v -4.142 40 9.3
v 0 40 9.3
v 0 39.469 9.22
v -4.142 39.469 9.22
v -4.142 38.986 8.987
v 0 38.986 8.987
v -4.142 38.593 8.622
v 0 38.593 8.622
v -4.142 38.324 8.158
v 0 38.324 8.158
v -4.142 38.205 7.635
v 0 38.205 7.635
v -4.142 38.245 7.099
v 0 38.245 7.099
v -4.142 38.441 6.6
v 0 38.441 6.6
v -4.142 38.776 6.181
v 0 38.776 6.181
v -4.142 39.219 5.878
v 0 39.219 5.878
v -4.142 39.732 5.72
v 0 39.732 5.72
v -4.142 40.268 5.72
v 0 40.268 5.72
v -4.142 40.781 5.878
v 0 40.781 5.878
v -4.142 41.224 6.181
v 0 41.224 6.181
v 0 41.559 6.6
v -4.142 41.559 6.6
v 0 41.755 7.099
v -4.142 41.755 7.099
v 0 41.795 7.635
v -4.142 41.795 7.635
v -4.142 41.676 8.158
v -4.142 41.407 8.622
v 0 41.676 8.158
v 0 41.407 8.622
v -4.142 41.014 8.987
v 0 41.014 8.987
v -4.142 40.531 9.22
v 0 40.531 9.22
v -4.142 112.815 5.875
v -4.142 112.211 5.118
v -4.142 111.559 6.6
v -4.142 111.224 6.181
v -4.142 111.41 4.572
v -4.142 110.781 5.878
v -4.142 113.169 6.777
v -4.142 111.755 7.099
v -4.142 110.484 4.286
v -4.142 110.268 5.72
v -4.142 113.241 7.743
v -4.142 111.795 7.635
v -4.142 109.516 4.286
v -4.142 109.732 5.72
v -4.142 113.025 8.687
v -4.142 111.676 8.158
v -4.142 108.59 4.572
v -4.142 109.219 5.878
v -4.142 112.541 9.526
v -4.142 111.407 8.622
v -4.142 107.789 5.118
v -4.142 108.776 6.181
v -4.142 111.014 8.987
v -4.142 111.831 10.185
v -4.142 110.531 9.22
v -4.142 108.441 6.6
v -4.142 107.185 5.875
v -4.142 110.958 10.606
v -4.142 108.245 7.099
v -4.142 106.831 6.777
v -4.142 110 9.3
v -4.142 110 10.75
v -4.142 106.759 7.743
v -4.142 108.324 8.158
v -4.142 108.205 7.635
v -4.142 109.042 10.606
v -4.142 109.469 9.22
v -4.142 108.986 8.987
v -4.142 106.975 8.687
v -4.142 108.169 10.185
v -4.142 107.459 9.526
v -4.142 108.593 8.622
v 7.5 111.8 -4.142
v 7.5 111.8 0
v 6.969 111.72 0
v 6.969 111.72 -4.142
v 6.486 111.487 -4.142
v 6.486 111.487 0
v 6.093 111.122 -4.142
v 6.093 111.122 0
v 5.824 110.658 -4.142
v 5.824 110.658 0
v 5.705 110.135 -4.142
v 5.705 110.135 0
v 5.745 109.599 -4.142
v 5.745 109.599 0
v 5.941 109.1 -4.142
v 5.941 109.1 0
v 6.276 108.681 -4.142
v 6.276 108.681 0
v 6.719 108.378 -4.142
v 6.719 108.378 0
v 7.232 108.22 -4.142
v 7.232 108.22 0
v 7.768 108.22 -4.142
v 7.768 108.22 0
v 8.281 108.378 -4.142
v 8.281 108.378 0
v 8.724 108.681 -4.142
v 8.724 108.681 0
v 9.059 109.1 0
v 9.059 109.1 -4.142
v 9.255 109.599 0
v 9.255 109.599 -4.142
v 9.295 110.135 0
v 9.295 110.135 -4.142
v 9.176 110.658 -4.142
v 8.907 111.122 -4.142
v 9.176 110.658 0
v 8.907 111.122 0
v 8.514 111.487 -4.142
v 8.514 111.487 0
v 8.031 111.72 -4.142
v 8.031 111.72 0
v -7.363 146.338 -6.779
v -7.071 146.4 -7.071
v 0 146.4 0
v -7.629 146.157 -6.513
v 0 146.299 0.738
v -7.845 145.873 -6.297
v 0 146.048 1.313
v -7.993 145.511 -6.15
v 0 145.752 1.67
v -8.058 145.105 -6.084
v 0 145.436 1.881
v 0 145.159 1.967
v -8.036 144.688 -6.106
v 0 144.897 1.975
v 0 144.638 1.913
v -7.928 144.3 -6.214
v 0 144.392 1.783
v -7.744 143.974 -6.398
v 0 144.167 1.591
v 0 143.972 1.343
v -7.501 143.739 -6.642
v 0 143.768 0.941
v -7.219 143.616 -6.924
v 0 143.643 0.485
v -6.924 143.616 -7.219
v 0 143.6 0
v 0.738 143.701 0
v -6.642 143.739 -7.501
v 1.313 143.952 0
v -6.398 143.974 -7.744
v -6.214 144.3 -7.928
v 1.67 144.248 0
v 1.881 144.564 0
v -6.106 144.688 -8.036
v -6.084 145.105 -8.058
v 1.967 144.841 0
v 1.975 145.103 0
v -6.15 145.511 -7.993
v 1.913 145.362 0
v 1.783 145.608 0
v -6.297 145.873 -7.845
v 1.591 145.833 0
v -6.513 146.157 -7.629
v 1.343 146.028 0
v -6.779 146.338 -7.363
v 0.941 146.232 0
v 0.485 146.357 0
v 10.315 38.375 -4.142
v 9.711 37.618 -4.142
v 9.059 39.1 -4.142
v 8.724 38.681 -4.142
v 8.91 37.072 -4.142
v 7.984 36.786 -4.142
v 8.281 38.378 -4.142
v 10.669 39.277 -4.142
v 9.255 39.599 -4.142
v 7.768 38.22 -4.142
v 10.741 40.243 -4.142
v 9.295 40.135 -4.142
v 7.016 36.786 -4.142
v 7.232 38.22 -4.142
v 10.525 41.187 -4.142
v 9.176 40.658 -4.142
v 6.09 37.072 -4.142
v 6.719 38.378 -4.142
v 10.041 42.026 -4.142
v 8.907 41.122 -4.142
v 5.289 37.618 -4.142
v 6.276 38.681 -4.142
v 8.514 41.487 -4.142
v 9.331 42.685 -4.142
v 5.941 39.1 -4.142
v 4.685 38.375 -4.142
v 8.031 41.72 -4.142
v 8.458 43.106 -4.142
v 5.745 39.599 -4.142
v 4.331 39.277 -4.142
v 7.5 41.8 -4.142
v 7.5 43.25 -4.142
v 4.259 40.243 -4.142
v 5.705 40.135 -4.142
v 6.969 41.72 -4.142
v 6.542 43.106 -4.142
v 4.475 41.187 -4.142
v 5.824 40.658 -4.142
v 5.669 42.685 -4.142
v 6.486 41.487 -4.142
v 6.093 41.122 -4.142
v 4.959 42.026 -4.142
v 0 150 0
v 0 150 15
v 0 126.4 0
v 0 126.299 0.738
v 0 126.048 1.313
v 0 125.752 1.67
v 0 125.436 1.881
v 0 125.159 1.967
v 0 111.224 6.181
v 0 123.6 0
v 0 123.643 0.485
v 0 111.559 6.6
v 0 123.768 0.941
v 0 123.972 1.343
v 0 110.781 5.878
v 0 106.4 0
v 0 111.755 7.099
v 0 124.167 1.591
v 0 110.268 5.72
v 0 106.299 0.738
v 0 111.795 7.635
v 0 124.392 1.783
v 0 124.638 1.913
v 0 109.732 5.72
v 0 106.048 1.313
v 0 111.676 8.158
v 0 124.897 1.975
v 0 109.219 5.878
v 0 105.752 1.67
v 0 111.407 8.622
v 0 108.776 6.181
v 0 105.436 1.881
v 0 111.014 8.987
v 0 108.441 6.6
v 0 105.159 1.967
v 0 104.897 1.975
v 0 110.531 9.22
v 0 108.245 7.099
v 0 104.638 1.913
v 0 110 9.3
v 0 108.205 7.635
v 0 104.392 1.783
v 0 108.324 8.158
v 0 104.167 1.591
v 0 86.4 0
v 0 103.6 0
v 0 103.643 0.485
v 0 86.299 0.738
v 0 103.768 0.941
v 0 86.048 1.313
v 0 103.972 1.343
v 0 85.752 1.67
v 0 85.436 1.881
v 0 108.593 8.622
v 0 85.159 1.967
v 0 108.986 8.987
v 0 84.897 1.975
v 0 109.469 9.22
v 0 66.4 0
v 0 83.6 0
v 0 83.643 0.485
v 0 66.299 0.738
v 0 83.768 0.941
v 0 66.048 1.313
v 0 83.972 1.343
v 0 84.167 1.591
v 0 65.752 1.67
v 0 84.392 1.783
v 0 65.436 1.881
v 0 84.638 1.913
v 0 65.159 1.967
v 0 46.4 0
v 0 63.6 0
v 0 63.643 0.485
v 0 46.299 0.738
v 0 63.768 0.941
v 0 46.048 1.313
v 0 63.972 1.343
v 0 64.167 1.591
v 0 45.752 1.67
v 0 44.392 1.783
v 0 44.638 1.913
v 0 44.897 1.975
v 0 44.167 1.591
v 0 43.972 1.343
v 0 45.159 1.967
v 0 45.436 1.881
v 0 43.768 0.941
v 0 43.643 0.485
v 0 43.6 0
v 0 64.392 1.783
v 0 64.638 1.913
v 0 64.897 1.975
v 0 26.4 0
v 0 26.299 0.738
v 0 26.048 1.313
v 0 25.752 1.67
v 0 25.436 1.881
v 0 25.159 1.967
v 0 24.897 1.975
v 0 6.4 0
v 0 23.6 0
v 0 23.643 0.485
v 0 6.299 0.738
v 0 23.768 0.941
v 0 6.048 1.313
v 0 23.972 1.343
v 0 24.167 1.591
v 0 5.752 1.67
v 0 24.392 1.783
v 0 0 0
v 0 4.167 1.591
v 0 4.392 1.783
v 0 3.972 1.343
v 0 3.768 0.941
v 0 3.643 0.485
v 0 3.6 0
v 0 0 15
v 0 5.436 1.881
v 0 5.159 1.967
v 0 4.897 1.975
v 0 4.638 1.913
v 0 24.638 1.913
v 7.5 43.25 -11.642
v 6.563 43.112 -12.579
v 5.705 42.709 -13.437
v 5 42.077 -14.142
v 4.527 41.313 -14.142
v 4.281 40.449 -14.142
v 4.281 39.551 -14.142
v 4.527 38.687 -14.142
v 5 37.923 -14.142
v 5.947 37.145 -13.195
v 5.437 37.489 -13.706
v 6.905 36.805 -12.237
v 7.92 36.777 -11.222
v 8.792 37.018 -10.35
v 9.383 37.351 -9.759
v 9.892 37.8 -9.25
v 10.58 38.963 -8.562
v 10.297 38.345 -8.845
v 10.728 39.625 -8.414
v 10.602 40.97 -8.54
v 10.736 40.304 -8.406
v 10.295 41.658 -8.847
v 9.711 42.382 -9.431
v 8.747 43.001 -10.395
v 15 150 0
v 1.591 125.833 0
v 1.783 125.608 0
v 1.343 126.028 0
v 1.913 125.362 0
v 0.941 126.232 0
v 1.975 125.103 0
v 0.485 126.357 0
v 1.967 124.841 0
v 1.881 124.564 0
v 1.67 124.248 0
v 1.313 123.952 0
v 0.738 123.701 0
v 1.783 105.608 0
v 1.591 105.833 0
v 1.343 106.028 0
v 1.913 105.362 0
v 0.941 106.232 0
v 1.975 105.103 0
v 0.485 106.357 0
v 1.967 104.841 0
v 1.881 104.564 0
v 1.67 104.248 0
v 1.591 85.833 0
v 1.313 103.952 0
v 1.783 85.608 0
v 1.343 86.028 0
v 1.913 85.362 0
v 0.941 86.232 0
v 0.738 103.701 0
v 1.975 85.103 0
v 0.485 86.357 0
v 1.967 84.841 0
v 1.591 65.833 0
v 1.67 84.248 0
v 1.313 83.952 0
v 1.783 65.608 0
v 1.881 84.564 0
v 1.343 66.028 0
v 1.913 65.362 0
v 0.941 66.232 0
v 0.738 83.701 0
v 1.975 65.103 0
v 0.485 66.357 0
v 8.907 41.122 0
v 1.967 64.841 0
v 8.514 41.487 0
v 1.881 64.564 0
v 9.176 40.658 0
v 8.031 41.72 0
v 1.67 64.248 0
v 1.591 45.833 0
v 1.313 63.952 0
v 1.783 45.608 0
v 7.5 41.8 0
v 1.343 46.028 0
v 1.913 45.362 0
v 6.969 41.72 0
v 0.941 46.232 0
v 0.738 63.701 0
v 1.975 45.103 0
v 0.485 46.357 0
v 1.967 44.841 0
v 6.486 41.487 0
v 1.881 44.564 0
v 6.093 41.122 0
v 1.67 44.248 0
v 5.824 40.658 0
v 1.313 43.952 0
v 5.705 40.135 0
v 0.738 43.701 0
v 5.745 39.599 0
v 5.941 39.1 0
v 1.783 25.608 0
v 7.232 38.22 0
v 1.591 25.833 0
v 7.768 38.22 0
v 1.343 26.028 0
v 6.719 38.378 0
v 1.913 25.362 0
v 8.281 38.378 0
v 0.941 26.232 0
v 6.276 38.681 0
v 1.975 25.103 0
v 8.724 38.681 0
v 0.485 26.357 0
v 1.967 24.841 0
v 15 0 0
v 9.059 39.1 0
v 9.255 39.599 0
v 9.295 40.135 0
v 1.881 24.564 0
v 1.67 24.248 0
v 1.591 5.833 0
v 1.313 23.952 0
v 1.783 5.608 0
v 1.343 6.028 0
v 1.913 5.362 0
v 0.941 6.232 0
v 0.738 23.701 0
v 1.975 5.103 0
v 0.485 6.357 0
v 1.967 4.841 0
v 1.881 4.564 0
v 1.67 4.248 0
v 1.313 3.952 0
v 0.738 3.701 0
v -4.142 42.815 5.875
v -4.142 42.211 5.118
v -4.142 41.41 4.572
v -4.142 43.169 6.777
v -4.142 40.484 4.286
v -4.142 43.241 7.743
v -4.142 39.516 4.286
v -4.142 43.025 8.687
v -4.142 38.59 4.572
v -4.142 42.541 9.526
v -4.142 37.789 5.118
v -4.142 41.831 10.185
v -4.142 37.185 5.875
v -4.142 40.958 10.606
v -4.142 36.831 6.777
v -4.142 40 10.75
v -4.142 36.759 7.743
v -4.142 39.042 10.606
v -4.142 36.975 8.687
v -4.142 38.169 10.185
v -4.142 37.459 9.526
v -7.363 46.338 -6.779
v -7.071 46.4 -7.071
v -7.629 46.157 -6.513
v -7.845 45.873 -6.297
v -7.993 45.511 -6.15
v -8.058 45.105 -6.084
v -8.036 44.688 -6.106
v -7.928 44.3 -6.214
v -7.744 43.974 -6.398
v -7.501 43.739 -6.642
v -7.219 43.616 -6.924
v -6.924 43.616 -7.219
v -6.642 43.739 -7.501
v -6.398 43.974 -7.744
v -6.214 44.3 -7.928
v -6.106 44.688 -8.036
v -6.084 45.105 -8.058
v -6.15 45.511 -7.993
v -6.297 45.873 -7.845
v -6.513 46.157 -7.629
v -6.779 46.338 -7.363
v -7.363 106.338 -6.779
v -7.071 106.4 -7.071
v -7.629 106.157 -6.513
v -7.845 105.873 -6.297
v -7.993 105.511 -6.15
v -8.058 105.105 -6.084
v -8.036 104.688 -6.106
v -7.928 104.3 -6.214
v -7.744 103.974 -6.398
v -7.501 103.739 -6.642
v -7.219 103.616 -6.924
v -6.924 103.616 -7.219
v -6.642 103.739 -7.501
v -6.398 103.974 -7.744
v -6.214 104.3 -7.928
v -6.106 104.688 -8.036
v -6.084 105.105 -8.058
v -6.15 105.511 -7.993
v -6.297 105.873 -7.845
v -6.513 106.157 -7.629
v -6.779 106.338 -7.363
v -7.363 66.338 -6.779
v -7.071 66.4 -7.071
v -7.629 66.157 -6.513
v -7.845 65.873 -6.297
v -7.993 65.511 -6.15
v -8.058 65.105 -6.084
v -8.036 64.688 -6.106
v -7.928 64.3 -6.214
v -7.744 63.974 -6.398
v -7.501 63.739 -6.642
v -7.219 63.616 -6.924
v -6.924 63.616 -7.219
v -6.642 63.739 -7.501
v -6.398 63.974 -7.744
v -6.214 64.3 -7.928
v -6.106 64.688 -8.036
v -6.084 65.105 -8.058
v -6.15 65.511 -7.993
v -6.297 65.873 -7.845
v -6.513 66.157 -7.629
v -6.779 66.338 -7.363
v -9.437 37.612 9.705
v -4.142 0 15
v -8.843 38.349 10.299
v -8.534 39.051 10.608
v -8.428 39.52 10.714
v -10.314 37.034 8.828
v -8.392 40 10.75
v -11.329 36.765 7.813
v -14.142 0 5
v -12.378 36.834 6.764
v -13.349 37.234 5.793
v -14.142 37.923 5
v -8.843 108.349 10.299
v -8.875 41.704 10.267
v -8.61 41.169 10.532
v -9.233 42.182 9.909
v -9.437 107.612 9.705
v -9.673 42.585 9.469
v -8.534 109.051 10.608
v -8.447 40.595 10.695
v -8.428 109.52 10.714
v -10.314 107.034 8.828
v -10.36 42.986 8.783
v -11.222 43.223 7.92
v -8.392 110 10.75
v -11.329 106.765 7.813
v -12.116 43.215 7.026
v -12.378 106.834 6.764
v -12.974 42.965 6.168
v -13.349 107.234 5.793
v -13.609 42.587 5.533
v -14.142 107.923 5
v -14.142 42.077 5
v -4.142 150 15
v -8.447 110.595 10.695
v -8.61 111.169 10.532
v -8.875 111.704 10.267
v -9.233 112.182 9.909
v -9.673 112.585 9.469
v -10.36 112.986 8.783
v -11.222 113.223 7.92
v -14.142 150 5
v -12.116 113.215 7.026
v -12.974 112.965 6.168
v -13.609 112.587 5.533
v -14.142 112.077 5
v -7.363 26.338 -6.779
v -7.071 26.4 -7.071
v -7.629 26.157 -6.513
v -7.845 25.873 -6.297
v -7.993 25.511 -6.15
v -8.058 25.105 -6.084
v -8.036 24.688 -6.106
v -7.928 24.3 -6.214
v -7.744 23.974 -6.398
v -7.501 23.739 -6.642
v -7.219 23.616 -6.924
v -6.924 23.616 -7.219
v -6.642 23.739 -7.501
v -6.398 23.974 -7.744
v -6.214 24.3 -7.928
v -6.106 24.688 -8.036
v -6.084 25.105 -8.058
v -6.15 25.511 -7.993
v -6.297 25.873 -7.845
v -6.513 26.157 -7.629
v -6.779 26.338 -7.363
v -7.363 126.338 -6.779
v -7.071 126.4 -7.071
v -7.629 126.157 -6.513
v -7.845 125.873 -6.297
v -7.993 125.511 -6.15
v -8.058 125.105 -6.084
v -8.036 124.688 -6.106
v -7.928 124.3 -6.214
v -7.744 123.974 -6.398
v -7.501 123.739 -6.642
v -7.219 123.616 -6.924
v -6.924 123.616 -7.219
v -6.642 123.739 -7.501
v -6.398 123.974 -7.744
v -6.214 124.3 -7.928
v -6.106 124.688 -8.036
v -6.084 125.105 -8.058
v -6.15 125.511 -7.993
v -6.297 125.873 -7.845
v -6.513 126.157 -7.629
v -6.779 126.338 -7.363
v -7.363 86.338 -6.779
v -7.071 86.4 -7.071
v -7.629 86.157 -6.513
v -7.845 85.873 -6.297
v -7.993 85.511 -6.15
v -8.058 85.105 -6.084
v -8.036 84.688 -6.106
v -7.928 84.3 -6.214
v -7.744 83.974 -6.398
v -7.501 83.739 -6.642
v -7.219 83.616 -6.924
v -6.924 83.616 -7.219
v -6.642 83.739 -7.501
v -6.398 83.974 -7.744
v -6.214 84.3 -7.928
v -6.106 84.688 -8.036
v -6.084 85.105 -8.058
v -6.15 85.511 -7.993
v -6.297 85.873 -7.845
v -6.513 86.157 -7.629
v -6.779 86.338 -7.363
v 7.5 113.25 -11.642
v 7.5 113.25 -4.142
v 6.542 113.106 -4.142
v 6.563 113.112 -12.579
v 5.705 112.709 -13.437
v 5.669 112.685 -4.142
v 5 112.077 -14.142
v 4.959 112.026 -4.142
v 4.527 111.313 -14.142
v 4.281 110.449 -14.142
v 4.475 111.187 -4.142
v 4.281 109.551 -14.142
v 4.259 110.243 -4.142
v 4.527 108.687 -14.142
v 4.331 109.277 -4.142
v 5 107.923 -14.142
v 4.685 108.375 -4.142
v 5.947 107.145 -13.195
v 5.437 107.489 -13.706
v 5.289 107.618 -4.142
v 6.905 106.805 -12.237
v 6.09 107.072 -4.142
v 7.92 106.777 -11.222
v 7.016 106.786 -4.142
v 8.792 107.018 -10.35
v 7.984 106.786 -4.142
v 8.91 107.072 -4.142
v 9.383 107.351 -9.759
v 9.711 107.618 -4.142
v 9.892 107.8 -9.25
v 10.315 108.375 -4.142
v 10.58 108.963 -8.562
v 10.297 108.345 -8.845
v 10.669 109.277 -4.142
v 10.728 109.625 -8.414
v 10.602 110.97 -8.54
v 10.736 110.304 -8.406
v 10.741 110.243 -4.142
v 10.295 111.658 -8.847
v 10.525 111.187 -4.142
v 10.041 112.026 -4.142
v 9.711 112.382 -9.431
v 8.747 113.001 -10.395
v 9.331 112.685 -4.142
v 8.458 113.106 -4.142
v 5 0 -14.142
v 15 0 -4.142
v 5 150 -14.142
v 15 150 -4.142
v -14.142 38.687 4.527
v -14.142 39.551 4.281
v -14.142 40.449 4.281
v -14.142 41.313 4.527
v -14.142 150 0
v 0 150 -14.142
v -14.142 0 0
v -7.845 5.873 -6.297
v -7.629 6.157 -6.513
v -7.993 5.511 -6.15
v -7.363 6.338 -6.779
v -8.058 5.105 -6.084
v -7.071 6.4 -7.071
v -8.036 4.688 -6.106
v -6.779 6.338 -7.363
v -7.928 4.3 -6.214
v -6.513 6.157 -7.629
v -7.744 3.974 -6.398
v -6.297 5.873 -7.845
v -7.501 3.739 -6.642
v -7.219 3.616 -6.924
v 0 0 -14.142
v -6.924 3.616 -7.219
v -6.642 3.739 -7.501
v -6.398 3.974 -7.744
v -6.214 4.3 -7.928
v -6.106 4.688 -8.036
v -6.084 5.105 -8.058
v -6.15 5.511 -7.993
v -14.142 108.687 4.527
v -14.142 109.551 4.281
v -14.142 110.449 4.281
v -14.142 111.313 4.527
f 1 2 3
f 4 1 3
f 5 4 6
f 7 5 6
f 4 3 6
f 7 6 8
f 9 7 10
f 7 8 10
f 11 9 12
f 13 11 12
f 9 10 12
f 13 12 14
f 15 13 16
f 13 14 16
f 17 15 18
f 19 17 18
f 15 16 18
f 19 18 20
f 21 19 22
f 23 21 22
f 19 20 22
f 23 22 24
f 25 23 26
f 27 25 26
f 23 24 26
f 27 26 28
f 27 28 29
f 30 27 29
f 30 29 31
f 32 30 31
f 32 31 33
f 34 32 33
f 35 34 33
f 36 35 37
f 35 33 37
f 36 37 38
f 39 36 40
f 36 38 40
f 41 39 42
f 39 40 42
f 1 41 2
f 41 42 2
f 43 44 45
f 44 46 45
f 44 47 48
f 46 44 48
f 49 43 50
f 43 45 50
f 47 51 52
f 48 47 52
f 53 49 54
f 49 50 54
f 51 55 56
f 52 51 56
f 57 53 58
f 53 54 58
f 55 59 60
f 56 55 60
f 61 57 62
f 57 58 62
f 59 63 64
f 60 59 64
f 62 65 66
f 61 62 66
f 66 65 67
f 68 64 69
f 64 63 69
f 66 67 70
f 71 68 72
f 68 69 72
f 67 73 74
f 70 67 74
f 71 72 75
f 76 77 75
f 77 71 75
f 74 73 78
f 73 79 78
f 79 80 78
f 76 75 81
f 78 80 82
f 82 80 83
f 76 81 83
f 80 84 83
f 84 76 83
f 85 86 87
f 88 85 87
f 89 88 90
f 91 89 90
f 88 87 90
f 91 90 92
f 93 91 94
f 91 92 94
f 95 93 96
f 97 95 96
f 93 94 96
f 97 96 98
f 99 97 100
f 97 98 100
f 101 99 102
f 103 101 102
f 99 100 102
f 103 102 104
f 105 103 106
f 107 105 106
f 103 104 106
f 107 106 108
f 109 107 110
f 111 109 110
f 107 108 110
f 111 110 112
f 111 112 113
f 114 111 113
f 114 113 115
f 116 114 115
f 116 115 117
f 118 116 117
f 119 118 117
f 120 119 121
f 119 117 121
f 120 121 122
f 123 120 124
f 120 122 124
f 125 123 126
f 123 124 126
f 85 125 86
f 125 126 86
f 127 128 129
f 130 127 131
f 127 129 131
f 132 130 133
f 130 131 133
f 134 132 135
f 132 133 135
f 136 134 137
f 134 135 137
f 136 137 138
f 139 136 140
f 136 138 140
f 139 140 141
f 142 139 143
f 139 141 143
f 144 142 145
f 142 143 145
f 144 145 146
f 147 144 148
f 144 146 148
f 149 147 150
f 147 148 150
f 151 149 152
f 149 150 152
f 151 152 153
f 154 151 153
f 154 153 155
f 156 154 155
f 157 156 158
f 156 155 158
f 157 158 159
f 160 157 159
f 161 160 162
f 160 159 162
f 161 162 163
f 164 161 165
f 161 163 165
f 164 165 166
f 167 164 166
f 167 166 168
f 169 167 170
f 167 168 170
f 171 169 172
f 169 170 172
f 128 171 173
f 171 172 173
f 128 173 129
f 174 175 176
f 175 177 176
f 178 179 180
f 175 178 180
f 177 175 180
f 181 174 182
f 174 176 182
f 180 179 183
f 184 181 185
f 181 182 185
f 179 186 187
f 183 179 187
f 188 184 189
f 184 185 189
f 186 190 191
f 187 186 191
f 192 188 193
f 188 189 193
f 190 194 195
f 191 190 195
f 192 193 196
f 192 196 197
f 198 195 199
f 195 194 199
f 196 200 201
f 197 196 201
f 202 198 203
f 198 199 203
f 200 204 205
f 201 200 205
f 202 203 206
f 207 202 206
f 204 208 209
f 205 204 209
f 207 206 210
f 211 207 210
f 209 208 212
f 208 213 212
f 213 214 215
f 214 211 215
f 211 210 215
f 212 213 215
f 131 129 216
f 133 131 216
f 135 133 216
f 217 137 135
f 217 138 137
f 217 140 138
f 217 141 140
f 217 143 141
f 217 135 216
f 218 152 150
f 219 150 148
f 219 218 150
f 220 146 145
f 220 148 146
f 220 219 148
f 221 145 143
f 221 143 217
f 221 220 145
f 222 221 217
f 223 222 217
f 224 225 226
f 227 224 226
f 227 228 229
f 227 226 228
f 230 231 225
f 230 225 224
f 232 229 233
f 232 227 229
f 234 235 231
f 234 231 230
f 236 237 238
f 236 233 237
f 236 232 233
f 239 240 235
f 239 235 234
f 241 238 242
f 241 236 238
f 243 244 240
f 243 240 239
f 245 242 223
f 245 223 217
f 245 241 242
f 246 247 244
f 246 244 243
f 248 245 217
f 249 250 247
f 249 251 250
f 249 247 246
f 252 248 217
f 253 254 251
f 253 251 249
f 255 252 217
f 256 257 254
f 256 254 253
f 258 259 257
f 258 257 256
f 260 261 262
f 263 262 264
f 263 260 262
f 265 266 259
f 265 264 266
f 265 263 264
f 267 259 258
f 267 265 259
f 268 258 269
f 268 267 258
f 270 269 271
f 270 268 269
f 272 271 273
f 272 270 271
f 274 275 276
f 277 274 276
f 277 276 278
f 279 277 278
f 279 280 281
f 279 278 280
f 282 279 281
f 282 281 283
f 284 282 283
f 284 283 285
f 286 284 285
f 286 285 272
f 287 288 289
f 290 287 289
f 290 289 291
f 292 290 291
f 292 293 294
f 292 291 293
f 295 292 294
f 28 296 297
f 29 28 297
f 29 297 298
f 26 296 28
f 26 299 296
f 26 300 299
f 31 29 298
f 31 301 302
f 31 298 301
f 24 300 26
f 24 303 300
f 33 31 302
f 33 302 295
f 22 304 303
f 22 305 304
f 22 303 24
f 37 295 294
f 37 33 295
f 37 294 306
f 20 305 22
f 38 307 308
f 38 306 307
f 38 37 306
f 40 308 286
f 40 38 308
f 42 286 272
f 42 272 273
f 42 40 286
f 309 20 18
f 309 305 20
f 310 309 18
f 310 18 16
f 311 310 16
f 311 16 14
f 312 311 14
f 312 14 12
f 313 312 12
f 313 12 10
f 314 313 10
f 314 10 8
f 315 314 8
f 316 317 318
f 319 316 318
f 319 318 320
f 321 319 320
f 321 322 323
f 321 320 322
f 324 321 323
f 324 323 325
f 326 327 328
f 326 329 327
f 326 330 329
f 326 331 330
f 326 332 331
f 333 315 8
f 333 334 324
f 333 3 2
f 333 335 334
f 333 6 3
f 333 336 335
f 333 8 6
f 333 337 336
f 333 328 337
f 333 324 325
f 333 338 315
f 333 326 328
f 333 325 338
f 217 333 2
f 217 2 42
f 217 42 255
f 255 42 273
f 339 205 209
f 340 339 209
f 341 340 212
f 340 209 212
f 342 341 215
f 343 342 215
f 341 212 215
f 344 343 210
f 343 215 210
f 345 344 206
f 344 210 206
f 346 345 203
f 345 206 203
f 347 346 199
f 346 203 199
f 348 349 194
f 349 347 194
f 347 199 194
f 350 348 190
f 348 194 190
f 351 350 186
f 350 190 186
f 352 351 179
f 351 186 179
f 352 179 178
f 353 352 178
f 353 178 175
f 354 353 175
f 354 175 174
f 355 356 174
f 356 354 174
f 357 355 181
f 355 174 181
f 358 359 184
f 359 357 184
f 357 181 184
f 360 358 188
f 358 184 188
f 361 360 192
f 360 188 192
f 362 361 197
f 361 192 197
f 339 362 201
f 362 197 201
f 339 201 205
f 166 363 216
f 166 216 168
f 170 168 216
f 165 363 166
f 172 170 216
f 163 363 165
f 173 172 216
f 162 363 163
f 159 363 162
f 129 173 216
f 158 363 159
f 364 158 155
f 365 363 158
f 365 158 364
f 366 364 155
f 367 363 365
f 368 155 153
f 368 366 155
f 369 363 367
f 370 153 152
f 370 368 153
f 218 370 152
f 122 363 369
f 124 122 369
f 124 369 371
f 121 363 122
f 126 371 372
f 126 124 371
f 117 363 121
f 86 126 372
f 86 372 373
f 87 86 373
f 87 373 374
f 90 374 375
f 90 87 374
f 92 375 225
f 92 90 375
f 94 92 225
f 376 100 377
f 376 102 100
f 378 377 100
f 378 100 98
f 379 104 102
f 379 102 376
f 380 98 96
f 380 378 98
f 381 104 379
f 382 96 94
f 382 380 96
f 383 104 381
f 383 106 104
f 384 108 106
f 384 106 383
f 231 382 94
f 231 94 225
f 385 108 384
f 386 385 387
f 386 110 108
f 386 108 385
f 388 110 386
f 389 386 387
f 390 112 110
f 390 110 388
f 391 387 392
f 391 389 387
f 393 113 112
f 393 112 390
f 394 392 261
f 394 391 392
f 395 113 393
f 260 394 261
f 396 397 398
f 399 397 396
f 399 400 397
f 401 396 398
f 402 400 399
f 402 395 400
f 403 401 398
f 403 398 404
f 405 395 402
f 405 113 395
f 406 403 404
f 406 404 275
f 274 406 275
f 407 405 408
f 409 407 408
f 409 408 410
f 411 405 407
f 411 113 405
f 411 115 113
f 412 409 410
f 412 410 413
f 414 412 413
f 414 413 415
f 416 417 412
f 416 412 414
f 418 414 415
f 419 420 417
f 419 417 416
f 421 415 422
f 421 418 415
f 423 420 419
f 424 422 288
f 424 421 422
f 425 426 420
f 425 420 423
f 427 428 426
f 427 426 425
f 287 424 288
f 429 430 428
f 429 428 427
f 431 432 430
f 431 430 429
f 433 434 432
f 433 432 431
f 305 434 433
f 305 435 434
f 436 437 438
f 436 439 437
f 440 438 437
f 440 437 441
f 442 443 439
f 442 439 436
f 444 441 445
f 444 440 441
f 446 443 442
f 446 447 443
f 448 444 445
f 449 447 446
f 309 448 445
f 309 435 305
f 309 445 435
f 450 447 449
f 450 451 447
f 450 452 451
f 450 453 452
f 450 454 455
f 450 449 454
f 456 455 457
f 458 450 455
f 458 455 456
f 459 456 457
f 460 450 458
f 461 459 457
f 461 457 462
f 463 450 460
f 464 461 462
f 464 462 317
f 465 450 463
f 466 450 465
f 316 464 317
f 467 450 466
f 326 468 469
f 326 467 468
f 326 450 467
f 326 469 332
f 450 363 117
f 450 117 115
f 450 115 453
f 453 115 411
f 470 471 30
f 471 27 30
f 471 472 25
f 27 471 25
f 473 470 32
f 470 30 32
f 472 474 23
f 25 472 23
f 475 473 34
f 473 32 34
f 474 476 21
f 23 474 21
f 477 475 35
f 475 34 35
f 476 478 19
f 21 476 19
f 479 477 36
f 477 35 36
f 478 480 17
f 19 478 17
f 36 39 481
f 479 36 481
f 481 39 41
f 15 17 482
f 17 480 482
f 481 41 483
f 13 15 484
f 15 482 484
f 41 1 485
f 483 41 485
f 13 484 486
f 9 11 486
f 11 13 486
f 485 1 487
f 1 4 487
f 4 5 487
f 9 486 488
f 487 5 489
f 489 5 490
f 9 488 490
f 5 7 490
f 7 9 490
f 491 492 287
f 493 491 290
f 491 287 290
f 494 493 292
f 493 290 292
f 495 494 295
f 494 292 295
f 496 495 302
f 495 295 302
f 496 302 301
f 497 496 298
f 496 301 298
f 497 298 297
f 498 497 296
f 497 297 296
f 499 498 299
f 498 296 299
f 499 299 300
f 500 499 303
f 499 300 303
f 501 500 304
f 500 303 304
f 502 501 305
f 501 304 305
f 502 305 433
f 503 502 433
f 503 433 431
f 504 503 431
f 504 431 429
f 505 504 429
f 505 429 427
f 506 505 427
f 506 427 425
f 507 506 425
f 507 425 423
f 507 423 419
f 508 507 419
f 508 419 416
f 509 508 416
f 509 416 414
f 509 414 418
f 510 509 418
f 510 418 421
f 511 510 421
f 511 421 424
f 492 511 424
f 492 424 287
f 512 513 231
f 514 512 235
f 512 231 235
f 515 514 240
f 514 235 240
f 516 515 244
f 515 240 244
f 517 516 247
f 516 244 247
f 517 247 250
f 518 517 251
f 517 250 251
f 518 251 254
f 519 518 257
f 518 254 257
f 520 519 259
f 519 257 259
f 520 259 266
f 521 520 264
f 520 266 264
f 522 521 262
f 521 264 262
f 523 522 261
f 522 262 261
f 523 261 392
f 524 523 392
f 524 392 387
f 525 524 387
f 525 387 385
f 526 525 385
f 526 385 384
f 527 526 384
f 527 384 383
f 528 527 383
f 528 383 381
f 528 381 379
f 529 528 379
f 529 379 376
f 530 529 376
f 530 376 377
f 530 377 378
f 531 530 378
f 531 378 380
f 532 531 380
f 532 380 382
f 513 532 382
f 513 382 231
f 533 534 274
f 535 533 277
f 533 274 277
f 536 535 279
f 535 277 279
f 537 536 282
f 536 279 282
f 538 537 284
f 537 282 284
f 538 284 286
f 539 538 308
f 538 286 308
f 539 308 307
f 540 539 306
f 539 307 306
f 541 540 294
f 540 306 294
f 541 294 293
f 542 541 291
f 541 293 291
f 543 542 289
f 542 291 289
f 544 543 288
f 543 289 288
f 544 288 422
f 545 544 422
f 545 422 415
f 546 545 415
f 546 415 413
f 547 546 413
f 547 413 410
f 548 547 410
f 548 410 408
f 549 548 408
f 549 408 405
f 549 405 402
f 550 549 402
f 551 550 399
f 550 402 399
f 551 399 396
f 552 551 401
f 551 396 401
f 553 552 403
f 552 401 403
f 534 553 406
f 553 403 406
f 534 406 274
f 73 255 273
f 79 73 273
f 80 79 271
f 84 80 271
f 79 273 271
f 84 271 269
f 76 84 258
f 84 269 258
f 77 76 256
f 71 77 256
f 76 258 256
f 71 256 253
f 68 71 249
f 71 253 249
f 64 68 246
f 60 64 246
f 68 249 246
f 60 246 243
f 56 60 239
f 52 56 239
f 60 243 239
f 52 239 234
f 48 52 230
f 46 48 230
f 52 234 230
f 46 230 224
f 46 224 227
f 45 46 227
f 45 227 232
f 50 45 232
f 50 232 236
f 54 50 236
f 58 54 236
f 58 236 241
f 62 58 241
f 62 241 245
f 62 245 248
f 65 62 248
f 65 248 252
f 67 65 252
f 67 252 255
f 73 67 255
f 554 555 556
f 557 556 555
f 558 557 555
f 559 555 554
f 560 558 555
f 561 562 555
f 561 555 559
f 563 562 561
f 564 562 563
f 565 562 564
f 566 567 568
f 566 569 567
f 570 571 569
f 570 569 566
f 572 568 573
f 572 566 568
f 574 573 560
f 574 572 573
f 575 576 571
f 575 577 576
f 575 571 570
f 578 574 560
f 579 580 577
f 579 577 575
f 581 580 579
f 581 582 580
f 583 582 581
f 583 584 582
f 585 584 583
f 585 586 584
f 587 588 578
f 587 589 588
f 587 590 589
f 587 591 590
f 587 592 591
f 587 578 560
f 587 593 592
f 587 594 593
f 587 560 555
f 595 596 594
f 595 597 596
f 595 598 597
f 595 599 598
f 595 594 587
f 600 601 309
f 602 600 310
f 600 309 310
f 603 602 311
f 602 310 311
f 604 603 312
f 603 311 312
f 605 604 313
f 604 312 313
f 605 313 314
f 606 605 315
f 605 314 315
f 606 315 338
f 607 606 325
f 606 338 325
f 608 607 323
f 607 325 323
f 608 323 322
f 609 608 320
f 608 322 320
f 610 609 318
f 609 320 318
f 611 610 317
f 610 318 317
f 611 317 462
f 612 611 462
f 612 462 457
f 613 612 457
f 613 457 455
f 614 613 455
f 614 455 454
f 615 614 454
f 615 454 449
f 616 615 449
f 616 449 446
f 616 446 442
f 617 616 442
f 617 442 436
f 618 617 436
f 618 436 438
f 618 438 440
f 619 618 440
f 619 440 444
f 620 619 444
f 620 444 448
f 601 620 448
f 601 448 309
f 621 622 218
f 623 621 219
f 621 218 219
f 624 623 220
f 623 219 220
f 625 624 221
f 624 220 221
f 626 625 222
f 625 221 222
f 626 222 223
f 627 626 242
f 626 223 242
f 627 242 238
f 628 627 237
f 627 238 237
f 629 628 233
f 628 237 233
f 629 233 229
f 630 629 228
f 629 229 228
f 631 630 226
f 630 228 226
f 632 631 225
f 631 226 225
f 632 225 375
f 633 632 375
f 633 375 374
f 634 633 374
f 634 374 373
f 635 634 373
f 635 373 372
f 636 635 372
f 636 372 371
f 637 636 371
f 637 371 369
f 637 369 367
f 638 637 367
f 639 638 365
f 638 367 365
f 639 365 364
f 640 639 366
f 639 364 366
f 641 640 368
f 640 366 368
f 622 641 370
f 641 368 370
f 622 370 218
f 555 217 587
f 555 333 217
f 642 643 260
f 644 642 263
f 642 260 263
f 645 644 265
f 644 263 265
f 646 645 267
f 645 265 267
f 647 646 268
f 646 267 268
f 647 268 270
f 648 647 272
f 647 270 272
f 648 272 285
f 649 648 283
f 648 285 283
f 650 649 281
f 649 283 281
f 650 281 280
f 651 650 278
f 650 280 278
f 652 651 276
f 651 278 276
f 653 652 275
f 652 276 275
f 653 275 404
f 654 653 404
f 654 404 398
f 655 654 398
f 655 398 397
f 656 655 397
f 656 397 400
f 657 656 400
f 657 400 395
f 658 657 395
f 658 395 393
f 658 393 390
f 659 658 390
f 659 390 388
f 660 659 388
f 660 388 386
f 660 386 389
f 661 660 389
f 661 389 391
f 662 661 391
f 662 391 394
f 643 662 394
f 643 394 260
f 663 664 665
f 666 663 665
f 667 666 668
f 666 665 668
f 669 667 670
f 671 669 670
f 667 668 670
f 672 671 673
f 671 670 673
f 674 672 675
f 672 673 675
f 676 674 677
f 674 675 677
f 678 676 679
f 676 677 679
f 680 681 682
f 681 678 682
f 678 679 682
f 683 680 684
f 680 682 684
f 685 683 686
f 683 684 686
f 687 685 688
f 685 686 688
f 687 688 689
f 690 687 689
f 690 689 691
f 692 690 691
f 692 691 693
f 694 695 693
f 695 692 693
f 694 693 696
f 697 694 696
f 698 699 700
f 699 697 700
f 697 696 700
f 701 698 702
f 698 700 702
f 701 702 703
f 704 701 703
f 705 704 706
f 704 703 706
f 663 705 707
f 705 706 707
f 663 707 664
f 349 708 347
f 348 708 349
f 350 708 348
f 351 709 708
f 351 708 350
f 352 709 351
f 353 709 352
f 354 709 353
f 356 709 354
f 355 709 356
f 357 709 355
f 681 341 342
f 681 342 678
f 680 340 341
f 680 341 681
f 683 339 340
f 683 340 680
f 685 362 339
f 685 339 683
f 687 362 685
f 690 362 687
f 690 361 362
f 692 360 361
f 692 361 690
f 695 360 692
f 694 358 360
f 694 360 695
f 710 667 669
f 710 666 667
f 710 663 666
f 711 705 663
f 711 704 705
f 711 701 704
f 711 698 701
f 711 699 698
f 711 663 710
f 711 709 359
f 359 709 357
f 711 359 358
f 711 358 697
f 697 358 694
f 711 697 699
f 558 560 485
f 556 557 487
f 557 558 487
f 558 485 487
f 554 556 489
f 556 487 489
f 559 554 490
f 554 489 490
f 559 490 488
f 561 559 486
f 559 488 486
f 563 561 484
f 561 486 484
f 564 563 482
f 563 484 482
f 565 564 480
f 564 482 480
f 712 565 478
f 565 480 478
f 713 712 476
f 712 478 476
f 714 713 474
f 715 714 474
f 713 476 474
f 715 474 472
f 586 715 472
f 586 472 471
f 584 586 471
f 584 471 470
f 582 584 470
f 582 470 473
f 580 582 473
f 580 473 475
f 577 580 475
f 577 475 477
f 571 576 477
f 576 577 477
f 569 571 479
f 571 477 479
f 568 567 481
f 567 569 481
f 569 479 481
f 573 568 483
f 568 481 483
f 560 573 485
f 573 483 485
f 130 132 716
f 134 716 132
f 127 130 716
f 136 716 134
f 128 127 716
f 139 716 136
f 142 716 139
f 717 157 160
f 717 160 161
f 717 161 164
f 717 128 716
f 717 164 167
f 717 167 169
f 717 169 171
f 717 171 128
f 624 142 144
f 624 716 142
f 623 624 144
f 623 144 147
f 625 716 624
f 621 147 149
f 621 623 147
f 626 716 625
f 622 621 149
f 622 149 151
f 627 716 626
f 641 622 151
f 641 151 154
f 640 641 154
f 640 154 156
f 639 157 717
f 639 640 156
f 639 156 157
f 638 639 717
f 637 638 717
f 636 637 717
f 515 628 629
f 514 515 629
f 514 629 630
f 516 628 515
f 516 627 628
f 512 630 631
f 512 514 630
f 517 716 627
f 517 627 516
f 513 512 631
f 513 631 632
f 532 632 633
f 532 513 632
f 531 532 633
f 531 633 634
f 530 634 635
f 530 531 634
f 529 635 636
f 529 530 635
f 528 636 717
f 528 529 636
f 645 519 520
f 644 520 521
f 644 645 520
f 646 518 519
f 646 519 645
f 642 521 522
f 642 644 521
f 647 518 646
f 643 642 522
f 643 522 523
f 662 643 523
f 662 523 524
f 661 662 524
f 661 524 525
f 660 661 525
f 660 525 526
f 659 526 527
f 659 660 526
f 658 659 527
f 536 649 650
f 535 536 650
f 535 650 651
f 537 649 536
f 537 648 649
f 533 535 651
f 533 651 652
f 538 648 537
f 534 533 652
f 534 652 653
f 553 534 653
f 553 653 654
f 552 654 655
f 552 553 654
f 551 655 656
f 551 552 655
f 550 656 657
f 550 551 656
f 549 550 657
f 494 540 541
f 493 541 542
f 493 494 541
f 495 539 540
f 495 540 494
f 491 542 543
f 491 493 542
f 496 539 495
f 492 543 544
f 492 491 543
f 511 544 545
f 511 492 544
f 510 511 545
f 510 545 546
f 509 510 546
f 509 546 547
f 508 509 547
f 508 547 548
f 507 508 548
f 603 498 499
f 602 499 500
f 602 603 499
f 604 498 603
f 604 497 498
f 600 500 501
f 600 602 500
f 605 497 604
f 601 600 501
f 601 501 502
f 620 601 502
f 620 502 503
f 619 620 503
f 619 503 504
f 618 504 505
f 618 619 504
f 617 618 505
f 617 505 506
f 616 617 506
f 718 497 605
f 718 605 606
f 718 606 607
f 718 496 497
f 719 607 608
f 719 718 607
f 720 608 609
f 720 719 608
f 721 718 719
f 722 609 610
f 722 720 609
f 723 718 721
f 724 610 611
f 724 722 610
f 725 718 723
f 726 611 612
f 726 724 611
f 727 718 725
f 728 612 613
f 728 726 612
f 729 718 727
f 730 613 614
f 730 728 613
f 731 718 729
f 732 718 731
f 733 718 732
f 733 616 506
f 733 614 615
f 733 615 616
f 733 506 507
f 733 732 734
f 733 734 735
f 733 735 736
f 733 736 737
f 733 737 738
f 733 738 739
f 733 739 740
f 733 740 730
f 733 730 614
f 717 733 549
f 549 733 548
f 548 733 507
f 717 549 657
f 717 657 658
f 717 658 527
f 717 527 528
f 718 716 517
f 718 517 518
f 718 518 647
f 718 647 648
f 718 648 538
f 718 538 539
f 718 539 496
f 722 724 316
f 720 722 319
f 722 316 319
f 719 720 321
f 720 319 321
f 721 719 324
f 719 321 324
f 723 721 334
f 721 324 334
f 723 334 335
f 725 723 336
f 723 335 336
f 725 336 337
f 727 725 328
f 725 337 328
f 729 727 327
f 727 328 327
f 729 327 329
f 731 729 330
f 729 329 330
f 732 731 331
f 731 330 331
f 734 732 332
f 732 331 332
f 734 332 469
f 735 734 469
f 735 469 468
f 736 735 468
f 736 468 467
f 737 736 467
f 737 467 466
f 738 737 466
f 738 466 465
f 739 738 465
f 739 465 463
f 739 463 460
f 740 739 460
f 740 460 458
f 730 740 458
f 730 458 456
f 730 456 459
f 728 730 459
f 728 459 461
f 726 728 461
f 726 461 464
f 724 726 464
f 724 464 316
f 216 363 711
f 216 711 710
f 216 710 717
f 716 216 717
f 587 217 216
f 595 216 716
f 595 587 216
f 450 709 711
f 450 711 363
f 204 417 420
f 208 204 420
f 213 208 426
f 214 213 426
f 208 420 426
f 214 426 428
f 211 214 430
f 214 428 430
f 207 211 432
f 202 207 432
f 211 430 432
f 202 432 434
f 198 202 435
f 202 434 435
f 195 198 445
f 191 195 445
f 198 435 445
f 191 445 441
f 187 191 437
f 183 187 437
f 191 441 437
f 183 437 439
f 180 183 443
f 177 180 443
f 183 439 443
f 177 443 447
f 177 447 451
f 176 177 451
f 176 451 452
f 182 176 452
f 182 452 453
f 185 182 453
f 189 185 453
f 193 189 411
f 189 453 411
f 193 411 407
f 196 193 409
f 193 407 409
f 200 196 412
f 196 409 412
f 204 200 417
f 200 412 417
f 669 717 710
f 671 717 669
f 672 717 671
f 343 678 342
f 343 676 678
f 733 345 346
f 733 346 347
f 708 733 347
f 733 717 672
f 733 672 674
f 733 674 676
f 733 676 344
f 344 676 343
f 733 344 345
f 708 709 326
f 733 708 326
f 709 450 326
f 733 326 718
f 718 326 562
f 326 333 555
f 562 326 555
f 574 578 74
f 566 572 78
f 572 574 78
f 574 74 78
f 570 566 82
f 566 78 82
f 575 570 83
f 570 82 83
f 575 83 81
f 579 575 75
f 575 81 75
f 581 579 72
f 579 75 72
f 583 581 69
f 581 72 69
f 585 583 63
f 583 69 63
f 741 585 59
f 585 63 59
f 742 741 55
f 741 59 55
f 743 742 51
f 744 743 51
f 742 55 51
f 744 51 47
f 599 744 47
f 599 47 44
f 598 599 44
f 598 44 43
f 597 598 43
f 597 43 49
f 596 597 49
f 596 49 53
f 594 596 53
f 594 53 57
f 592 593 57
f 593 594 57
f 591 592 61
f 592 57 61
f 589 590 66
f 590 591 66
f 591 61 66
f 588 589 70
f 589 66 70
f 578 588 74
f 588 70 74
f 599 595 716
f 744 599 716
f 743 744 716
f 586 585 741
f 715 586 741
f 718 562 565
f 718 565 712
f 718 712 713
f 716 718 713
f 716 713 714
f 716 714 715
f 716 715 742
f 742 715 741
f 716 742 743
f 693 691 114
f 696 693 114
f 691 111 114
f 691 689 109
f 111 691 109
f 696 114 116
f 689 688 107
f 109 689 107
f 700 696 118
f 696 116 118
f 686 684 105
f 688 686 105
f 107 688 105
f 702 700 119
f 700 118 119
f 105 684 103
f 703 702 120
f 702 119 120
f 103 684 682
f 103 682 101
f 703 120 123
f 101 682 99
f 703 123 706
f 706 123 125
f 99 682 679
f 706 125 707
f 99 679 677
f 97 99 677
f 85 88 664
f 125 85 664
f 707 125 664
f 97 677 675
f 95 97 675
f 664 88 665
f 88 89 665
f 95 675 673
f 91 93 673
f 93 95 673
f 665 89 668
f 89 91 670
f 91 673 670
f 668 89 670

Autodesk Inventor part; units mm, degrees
ref_plane "YZ Plane" through (0, 0, 0) normal (1, 0, 0) x (0, 1, 0)
ref_plane "XZ Plane" through (0, 0, 0) normal (0, 1, 0) x (-1, 0, 0)
ref_plane "XY Plane" through (0, 0, 0) normal (0, 0, 1) x (1, 0, 0)
sketch "Sketch1" plane through (0, 0, 0) normal (0, 1, 0) x (-1, 0, 0)
  line L0 (0, 0) -> (0, 15)
  line L1 (0, 15) -> (14.1421, 15)
  line L2 (14.1421, 15) -> (14.1421, 0)
  line L3 (14.1421, 0) -> (0, -14.1421)
  line L4 (0, -14.1421) -> (-15, -14.1421)
  line L5 (-15, -14.1421) -> (-15, 0)
  line L6 (-15, 0) -> (0, 0)
  dimension "d0" = 15
  dimension "d1" = 10
extrude "Extrusion1" add sketch "Sketch1" along normal blind 150
chamfer "Chamfer1" distance 10 angle 45 2 edges at (-14.1421, 75, 15) (15, 75, -14.1421)
sketch "Sketch2" plane through (-14.1421, 0, 0) normal (-1, 0, 0) x (0, 0, 1)
  line L0 (15, 150) -> (5, 150) projected
  line L1 (5, 150) -> (5, 0) projected
  line L2 (5, 0) -> (15, 0) projected
  line L3 (15, 0) -> (15, 150) projected
  line L4 (5, 150) -> (5, 0) projected
  line L5 (0, 150) -> (5, 150) projected
  line L6 (0, 0) -> (0, 150) projected
  line L7 (0, 0) -> (5, 0) projected
  point P0 (0, 0)
  point P1 (7.5, 40)
  point P2 (7.5, 110)
  dimension "d7" = 7.5
  dimension "d8" = 40
  dimension "d9" = 40
hole "Hole1" at (-14.1421, 40, 7.5) at (-14.1421, 110, 7.5) direction (1, 0, 0) diameter 3.6 end through all counterbore diameter 6.5 counterbore depth 10 clearance for "Socket Head Cap Screw ISO 4762" size "M3" standard "ISO"
sketch "Sketch3" plane through (0, 0, -14.1421) normal (0, 0, -1) x (-1, 0, 0)
  line L0 (-5, 150) -> (-15, 150) projected
  line L1 (-15, 150) -> (-15, 0) projected
  line L2 (-15, 0) -> (-5, 0) projected
  line L3 (-5, 0) -> (-5, 150) projected
  line L4 (-5, 0) -> (-5, 150) projected
  line L5 (-5, 0) -> (0, 0) projected
  line L6 (0, 0) -> (0, 150) projected
  line L7 (-5, 150) -> (0, 150) projected
  point P0 (-7.5, 40)
  point P1 (-7.5, 110)
  dimension "d17" = 40
  dimension "d18" = 40
  dimension "d26" = 7.5
hole "Hole2" at (7.5, 40, -14.1421) at (7.5, 110, -14.1421) direction (0, 0, 1) diameter 3.6 end through all counterbore diameter 6.5 counterbore depth 10
sketch "Sketch4" plane through (-14.1421, 0, 0) normal (-0.7071, 0, -0.7071) x (-0.7071, 0, 0.7071)
  circle A0 centre (-10, 25) radius 3 projected
  circle A1 centre (-10, 65) radius 3 projected
  circle A2 centre (-10, 105) radius 3 projected
  circle A3 centre (-10, 145) radius 3 projected
  circle A4 centre (-10, 185) radius 3 projected
  circle A5 centre (-10, 225) radius 3 projected
  circle A6 centre (-10, 265) radius 3 projected
  circle A7 centre (-10, 285) radius 3 projected
  circle A8 centre (-10, 245) radius 3 projected
  circle A9 centre (-10, 205) radius 3 projected
  circle A10 centre (-10, 165) radius 3 projected
  circle A11 centre (-10, 125) radius 3 projected
  circle A12 centre (-10, 85) radius 3 projected
  circle A13 centre (-10, 45) radius 3 projected
  circle A14 centre (-10, 5) radius 3 projected
  line L0 (-5.5, 290) -> (-14.5, 290) projected
  line L1 (-14.5, 290) -> (-14.5, -60) projected
  line L2 (-5.5, -60) -> (-14.5, -60) projected
  line L3 (-5.5, 290) -> (-5.5, -60) projected
  circle A15 centre (-10, -55) radius 3 projected
  circle A16 centre (-10, -15) radius 3 projected
  circle A17 centre (-10, -35) radius 3 projected
  point P0 (-10, 0)
hole "Hole3" at (-7.0711, 165, -7.0711) at (-7.0711, 145, -7.0711) at (-7.0711, 125, -7.0711) at (-7.0711, 105, -7.0711) at (-7.0711, 85, -7.0711) at (-7.0711, 65, -7.0711) at (-7.0711, 45, -7.0711) at (-7.0711, 25, -7.0711) at (-7.0711, 5, -7.0711) direction (0.7071, 0, 0.7071) diameter 2.8 end through all
equation "\"d9\" = d8"
equation "\"d18\" = d17"
properties part number "Corner Z Brace" material "ABS Plastic"
